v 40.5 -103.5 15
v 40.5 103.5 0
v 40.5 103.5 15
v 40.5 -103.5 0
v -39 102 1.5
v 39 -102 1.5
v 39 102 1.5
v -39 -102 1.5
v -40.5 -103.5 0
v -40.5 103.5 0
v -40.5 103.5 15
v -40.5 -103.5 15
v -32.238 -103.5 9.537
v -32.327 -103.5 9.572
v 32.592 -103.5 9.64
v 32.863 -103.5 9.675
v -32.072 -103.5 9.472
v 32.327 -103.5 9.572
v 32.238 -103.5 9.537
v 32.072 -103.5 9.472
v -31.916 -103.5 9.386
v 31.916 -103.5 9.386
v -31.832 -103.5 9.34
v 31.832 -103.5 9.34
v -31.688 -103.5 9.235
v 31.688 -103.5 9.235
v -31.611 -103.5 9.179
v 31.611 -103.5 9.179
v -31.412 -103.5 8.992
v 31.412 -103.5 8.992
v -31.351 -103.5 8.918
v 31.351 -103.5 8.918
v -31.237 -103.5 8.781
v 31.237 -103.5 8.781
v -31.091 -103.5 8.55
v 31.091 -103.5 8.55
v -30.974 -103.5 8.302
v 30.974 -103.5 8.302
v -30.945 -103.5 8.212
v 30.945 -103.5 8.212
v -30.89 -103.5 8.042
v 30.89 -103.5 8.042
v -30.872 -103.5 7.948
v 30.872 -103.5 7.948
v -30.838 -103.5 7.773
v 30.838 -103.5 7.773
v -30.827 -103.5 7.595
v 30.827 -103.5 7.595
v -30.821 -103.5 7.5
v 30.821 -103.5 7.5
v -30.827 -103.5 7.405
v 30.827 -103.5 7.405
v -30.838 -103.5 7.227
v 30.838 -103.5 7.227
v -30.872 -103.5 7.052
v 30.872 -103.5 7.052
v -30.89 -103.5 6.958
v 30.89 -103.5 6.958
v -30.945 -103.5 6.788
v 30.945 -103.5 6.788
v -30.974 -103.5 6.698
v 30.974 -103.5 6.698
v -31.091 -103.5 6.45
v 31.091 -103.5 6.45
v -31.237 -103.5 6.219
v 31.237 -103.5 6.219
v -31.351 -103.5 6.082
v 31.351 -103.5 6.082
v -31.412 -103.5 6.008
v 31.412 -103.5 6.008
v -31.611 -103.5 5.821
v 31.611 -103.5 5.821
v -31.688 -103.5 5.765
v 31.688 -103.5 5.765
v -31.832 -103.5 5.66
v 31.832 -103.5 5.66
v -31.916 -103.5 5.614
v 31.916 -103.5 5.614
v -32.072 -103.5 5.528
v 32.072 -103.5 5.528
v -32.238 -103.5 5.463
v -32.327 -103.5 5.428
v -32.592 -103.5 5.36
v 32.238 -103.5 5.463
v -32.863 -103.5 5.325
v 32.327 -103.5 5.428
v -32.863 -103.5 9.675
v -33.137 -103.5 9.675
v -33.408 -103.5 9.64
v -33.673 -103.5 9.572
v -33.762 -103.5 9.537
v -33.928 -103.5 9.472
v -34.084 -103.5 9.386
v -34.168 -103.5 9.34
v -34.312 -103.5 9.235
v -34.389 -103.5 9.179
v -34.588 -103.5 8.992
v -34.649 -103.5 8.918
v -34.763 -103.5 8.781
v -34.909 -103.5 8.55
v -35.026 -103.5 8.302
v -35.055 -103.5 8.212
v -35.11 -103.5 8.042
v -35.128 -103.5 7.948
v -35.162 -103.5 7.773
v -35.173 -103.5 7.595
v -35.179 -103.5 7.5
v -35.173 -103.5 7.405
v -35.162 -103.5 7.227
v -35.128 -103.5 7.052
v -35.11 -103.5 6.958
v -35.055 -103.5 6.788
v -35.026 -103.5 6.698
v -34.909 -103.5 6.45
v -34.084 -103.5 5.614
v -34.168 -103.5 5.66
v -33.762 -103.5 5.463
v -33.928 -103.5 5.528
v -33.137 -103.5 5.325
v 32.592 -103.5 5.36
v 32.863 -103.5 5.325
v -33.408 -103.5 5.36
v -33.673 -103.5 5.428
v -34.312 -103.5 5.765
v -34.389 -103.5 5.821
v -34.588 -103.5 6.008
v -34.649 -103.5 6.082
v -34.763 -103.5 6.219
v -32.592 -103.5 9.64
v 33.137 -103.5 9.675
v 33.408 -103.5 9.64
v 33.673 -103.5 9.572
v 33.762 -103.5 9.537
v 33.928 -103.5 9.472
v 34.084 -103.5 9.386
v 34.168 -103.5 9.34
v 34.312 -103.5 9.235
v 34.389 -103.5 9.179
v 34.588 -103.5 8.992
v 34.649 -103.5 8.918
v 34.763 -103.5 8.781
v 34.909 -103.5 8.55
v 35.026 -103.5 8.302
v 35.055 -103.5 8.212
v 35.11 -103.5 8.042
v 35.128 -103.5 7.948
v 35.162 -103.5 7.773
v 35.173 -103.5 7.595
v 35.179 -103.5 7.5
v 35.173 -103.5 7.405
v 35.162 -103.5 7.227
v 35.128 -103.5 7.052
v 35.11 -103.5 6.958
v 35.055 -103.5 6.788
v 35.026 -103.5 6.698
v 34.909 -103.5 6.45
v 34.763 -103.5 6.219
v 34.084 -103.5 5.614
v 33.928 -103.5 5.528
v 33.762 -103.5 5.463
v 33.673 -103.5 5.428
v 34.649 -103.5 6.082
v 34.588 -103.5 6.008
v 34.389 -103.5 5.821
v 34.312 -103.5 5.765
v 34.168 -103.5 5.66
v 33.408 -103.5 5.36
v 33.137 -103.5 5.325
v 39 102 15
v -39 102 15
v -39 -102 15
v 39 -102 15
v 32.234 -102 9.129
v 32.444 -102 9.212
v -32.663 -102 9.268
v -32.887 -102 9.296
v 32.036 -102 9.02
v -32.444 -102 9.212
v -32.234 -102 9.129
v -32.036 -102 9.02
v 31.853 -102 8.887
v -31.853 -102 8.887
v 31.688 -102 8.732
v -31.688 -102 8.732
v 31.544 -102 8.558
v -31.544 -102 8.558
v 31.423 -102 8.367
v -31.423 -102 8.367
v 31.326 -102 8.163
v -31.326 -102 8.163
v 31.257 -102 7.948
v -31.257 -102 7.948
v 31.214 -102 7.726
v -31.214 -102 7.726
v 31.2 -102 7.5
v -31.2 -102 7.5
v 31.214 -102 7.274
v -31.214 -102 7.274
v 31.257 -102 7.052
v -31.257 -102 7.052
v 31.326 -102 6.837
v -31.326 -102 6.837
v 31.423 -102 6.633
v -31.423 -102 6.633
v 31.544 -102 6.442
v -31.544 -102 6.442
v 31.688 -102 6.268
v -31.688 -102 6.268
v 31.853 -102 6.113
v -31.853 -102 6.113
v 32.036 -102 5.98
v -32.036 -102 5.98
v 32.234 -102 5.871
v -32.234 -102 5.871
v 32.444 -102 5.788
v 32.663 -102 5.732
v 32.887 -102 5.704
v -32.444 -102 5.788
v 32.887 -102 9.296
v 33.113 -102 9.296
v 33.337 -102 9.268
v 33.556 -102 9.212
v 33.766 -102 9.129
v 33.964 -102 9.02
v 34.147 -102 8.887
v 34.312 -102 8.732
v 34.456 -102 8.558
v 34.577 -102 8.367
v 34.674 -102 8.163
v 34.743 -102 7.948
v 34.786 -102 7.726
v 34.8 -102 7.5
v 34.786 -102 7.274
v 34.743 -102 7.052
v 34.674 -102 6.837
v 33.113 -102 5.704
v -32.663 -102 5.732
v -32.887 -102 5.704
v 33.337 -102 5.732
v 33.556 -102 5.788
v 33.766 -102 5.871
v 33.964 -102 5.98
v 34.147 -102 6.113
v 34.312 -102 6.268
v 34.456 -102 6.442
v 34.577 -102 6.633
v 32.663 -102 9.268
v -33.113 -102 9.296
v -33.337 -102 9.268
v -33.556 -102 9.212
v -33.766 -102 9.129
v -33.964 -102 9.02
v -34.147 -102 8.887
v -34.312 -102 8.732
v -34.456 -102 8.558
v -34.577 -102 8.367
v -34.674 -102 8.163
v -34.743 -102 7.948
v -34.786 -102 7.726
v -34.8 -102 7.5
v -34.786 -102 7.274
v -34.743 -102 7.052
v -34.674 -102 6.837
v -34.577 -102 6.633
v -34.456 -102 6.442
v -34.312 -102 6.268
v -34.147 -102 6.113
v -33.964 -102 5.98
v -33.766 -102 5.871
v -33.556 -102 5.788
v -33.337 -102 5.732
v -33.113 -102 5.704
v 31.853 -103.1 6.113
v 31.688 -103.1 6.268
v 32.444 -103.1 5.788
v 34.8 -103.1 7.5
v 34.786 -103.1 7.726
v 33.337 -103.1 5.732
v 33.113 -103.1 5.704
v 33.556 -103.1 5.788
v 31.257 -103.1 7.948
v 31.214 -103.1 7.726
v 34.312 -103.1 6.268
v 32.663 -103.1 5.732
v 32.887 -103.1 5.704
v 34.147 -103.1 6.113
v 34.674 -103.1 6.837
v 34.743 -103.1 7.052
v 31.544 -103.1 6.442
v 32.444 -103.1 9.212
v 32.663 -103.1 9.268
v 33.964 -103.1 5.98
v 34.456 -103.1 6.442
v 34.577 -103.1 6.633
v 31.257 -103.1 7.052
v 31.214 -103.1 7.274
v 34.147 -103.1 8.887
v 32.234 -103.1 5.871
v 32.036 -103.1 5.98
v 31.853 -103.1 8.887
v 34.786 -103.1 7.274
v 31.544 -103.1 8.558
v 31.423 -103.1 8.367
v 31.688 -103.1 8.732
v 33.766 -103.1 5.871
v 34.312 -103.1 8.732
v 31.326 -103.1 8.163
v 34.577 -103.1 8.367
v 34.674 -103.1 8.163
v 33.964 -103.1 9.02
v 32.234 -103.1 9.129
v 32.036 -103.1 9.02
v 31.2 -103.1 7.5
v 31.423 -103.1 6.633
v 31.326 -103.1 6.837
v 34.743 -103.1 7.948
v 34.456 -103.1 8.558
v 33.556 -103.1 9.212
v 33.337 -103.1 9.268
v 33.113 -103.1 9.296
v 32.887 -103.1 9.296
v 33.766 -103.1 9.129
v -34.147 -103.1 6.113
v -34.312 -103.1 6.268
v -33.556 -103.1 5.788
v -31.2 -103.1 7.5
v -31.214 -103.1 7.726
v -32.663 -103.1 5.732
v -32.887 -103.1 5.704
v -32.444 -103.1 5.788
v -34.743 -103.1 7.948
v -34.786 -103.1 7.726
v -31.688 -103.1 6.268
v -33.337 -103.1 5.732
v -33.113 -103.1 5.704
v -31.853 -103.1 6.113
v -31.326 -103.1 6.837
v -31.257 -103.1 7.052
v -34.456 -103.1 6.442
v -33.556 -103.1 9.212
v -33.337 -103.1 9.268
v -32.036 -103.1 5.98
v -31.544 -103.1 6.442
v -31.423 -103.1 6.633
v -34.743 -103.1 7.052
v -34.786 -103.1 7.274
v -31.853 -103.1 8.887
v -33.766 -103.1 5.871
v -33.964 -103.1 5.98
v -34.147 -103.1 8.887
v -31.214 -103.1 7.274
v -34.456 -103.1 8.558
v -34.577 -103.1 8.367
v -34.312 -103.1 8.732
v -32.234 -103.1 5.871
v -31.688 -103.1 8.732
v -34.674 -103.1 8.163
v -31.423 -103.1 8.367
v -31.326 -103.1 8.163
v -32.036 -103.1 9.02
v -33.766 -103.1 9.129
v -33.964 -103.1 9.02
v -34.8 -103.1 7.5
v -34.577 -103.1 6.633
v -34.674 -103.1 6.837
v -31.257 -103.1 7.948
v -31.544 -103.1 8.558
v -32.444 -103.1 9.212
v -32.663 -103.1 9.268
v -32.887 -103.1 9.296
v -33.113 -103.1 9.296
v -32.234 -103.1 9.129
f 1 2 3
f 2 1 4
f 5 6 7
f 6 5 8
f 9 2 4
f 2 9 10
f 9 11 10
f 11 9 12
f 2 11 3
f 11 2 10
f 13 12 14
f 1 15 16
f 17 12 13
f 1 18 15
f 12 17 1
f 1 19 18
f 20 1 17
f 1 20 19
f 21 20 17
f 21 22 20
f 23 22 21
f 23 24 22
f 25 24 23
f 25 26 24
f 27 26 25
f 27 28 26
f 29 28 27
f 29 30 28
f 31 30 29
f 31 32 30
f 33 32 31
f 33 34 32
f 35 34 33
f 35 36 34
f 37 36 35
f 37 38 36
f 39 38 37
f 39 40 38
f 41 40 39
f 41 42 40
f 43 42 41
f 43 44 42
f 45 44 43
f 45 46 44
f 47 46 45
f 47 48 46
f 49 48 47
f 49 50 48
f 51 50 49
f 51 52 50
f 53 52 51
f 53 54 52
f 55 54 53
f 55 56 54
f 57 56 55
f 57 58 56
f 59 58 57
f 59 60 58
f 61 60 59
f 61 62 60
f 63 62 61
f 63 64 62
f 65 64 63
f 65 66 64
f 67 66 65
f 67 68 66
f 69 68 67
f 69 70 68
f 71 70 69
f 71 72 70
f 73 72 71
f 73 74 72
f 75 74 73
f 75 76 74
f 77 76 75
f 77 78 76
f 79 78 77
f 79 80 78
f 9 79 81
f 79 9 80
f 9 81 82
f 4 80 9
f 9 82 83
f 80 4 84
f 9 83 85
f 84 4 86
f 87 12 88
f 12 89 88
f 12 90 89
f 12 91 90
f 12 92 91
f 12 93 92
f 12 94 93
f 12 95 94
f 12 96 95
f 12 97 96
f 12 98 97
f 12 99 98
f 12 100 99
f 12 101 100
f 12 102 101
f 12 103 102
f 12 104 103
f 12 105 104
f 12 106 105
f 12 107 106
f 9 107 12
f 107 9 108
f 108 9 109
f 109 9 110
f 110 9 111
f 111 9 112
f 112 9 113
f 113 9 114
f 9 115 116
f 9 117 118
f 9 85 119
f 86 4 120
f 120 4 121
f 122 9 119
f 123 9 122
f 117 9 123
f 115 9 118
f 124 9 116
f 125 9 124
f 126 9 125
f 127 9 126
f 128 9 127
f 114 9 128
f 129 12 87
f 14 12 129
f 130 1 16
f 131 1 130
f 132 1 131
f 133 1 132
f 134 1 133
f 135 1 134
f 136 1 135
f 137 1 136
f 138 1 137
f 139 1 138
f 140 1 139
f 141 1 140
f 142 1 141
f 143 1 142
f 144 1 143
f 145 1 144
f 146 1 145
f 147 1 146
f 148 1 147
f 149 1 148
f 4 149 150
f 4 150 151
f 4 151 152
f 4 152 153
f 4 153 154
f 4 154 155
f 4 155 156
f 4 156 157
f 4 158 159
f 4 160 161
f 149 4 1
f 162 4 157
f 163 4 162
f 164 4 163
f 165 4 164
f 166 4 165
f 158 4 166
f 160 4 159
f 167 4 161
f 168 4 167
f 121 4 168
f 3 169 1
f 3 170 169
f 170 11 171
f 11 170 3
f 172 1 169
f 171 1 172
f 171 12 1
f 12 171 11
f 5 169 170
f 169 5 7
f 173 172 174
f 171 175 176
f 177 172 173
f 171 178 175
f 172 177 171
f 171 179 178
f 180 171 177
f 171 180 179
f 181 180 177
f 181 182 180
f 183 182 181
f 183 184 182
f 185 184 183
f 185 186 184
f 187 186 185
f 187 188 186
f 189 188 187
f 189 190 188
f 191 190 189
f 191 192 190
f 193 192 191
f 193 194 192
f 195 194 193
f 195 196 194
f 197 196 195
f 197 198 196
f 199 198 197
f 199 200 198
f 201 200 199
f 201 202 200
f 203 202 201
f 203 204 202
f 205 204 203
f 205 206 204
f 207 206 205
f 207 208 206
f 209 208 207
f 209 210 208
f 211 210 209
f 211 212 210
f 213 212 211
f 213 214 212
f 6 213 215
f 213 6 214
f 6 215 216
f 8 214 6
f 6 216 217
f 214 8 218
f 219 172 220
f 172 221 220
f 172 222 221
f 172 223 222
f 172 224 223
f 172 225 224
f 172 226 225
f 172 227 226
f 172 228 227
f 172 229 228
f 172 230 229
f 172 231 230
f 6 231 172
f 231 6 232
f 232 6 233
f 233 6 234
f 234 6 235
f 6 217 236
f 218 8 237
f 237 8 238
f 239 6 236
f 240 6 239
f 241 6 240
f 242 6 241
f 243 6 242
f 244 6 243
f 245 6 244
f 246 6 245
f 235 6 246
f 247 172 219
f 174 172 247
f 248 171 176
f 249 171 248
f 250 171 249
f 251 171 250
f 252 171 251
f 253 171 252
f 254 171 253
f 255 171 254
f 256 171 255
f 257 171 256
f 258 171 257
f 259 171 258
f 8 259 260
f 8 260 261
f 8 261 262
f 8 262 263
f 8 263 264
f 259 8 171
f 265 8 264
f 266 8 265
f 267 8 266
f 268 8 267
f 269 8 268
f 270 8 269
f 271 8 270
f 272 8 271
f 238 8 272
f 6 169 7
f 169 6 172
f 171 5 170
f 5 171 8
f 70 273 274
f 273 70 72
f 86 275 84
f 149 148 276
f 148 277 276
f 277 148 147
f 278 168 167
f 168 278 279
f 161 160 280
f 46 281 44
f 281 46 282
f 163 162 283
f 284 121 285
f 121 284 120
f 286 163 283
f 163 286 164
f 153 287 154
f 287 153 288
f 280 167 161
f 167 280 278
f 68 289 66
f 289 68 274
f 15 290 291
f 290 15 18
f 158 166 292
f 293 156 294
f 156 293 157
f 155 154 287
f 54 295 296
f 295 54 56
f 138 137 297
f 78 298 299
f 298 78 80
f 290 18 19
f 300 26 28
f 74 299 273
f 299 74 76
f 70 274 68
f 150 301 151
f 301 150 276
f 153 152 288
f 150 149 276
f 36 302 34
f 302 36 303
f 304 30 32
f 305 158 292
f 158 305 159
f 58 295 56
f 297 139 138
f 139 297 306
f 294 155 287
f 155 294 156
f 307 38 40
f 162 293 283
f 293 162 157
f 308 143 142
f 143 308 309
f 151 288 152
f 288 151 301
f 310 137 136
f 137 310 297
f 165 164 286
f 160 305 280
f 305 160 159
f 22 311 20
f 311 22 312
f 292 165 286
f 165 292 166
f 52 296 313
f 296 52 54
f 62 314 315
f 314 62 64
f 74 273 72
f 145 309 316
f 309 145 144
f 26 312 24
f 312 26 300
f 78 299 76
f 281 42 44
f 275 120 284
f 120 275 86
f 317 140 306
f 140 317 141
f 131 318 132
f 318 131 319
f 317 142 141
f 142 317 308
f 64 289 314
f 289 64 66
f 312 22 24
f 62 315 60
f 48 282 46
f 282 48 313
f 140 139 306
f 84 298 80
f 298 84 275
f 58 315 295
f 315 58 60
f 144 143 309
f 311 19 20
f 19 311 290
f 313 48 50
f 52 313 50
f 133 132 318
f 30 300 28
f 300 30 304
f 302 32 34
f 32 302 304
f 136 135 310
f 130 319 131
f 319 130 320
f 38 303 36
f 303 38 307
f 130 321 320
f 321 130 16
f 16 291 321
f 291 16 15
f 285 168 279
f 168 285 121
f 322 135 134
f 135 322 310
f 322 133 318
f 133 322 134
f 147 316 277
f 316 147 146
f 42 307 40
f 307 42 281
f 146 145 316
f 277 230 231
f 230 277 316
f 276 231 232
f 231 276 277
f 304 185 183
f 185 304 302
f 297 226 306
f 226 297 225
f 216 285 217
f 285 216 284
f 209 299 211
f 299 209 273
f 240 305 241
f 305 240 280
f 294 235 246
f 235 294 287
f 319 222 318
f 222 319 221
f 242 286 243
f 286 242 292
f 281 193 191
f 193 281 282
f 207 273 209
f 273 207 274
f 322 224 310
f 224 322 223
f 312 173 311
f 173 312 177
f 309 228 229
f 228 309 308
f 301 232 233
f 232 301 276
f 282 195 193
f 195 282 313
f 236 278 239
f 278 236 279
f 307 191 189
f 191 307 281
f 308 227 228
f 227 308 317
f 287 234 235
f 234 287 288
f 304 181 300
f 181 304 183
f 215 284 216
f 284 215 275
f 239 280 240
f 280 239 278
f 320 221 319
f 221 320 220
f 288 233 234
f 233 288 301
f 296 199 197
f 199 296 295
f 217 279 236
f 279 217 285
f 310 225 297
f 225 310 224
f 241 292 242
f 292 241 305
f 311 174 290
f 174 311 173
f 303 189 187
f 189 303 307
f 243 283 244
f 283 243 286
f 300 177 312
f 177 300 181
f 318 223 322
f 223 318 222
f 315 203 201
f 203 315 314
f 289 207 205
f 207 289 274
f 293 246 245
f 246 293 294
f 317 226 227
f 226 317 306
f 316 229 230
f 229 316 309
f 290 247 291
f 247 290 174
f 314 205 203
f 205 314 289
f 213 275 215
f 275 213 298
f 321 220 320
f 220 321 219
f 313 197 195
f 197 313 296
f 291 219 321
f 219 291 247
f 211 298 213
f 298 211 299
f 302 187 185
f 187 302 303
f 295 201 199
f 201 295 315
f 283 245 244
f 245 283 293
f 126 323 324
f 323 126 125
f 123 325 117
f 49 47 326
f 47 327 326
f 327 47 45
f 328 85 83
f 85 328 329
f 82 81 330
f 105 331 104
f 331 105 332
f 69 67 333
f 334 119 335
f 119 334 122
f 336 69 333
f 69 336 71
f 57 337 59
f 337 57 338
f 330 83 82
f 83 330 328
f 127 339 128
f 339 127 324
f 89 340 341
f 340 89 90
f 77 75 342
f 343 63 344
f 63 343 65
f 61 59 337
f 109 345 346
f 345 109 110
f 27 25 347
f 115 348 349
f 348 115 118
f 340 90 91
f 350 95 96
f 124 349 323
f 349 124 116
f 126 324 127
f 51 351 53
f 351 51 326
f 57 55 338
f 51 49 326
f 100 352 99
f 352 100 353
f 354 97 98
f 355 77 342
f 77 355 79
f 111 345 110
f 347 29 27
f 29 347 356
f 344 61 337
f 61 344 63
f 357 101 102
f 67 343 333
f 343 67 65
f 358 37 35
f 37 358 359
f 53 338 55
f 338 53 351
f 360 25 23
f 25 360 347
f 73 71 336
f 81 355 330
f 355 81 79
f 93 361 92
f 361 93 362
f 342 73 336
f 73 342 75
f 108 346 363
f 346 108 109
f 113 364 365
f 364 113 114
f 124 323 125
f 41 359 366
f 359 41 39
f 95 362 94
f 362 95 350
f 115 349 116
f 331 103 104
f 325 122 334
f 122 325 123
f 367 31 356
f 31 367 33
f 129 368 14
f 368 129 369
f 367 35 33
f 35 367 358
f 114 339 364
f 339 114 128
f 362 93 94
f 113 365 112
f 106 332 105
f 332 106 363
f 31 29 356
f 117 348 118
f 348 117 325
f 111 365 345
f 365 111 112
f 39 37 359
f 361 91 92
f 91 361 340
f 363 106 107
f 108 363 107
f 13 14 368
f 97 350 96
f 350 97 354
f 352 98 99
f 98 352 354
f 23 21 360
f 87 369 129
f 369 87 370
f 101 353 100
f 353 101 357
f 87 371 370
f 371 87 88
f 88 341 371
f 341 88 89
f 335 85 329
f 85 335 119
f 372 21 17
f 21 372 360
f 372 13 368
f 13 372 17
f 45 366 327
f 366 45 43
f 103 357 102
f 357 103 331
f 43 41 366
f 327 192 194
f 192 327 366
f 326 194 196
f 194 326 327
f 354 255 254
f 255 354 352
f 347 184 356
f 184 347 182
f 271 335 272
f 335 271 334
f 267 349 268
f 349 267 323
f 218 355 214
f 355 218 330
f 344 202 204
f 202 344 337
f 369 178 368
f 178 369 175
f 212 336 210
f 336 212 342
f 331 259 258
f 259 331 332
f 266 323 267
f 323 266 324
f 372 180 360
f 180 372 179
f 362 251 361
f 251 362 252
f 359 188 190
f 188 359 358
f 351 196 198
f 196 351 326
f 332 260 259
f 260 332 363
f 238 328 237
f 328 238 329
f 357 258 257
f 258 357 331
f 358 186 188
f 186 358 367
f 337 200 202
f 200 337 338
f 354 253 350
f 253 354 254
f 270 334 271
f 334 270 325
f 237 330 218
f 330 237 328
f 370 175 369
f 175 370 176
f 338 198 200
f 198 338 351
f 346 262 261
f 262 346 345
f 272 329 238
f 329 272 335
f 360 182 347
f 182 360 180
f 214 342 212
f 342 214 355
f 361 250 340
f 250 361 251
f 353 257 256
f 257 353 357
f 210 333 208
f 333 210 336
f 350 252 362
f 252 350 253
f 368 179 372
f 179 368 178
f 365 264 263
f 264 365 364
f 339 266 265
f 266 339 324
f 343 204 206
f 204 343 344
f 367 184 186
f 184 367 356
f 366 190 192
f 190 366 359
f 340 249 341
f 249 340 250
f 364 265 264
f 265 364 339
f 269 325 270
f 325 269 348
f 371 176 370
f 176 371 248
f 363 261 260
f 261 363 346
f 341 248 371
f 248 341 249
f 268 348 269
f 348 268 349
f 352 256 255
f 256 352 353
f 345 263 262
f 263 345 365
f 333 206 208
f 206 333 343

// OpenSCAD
$fn = 50;


difference() {
	union() {
		translate(v = [-40.5000000000, -103.5000000000, 0]) {
			cube(size = [81, 207, 1.5000000000]);
		}
		translate(v = [-40.5000000000, 102.0000000000, 0]) {
			cube(size = [81, 1.5000000000, 15]);
		}
		translate(v = [-40.5000000000, -103.5000000000, 0]) {
			cube(size = [81, 1.5000000000, 15]);
		}
		translate(v = [39.0000000000, -103.5000000000, 0]) {
			cube(size = [1.5000000000, 207, 15]);
		}
		translate(v = [-40.5000000000, -103.5000000000, 0]) {
			cube(size = [1.5000000000, 207, 15]);
		}
	}
	union() {
		translate(v = [33.0000000000, -105.0000000000, 7.5000000000]) {
			rotate(a = [90, 0, 0]) {
				difference() {
					union() {
						#translate(v = [0, 0, -15.0000000000]) {
							cylinder(h = 15, r = 1.5000000000);
						}
						#translate(v = [0, 0, -1.9000000000]) {
							cylinder(h = 1.9000000000, r1 = 1.8000000000, r2 = 3.6000000000);
						}
						#translate(v = [0, 0, -15.0000000000]) {
							cylinder(h = 15, r = 1.8000000000);
						}
						#translate(v = [0, 0, -15.0000000000]) {
							cylinder(h = 15, r = 1.5000000000);
						}
					}
					union();
				}
			}
		}
		translate(v = [-33.0000000000, -105.0000000000, 7.5000000000]) {
			rotate(a = [90, 0, 0]) {
				difference() {
					union() {
						#translate(v = [0, 0, -15.0000000000]) {
							cylinder(h = 15, r = 1.5000000000);
						}
						#translate(v = [0, 0, -1.9000000000]) {
							cylinder(h = 1.9000000000, r1 = 1.8000000000, r2 = 3.6000000000);
						}
						#translate(v = [0, 0, -15.0000000000]) {
							cylinder(h = 15, r = 1.8000000000);
						}
						#translate(v = [0, 0, -15.0000000000]) {
							cylinder(h = 15, r = 1.5000000000);
						}
					}
					union();
				}
			}
		}
		translate(v = [33.0000000000, -105.0000000000, 7.5000000000]) {
			rotate(a = [90, 0, 0]) {
				difference() {
					union() {
						#translate(v = [0, 0, -15.0000000000]) {
							cylinder(h = 15, r = 1.5000000000);
						}
						#translate(v = [0, 0, -1.9000000000]) {
							cylinder(h = 1.9000000000, r1 = 1.8000000000, r2 = 3.6000000000);
						}
						#translate(v = [0, 0, -15.0000000000]) {
							cylinder(h = 15, r = 1.8000000000);
						}
						#translate(v = [0, 0, -15.0000000000]) {
							cylinder(h = 15, r = 1.5000000000);
						}
					}
					union();
				}
			}
		}
		translate(v = [-33.0000000000, -105.0000000000, 7.5000000000]) {
			rotate(a = [90, 0, 0]) {
				difference() {
					union() {
						#translate(v = [0, 0, -15.0000000000]) {
							cylinder(h = 15, r = 1.5000000000);
						}
						#translate(v = [0, 0, -1.9000000000]) {
							cylinder(h = 1.9000000000, r1 = 1.8000000000, r2 = 3.6000000000);
						}
						#translate(v = [0, 0, -15.0000000000]) {
							cylinder(h = 15, r = 1.8000000000);
						}
						#translate(v = [0, 0, -15.0000000000]) {
							cylinder(h = 15, r = 1.5000000000);
						}
					}
					union();
				}
			}
		}
	}
}
